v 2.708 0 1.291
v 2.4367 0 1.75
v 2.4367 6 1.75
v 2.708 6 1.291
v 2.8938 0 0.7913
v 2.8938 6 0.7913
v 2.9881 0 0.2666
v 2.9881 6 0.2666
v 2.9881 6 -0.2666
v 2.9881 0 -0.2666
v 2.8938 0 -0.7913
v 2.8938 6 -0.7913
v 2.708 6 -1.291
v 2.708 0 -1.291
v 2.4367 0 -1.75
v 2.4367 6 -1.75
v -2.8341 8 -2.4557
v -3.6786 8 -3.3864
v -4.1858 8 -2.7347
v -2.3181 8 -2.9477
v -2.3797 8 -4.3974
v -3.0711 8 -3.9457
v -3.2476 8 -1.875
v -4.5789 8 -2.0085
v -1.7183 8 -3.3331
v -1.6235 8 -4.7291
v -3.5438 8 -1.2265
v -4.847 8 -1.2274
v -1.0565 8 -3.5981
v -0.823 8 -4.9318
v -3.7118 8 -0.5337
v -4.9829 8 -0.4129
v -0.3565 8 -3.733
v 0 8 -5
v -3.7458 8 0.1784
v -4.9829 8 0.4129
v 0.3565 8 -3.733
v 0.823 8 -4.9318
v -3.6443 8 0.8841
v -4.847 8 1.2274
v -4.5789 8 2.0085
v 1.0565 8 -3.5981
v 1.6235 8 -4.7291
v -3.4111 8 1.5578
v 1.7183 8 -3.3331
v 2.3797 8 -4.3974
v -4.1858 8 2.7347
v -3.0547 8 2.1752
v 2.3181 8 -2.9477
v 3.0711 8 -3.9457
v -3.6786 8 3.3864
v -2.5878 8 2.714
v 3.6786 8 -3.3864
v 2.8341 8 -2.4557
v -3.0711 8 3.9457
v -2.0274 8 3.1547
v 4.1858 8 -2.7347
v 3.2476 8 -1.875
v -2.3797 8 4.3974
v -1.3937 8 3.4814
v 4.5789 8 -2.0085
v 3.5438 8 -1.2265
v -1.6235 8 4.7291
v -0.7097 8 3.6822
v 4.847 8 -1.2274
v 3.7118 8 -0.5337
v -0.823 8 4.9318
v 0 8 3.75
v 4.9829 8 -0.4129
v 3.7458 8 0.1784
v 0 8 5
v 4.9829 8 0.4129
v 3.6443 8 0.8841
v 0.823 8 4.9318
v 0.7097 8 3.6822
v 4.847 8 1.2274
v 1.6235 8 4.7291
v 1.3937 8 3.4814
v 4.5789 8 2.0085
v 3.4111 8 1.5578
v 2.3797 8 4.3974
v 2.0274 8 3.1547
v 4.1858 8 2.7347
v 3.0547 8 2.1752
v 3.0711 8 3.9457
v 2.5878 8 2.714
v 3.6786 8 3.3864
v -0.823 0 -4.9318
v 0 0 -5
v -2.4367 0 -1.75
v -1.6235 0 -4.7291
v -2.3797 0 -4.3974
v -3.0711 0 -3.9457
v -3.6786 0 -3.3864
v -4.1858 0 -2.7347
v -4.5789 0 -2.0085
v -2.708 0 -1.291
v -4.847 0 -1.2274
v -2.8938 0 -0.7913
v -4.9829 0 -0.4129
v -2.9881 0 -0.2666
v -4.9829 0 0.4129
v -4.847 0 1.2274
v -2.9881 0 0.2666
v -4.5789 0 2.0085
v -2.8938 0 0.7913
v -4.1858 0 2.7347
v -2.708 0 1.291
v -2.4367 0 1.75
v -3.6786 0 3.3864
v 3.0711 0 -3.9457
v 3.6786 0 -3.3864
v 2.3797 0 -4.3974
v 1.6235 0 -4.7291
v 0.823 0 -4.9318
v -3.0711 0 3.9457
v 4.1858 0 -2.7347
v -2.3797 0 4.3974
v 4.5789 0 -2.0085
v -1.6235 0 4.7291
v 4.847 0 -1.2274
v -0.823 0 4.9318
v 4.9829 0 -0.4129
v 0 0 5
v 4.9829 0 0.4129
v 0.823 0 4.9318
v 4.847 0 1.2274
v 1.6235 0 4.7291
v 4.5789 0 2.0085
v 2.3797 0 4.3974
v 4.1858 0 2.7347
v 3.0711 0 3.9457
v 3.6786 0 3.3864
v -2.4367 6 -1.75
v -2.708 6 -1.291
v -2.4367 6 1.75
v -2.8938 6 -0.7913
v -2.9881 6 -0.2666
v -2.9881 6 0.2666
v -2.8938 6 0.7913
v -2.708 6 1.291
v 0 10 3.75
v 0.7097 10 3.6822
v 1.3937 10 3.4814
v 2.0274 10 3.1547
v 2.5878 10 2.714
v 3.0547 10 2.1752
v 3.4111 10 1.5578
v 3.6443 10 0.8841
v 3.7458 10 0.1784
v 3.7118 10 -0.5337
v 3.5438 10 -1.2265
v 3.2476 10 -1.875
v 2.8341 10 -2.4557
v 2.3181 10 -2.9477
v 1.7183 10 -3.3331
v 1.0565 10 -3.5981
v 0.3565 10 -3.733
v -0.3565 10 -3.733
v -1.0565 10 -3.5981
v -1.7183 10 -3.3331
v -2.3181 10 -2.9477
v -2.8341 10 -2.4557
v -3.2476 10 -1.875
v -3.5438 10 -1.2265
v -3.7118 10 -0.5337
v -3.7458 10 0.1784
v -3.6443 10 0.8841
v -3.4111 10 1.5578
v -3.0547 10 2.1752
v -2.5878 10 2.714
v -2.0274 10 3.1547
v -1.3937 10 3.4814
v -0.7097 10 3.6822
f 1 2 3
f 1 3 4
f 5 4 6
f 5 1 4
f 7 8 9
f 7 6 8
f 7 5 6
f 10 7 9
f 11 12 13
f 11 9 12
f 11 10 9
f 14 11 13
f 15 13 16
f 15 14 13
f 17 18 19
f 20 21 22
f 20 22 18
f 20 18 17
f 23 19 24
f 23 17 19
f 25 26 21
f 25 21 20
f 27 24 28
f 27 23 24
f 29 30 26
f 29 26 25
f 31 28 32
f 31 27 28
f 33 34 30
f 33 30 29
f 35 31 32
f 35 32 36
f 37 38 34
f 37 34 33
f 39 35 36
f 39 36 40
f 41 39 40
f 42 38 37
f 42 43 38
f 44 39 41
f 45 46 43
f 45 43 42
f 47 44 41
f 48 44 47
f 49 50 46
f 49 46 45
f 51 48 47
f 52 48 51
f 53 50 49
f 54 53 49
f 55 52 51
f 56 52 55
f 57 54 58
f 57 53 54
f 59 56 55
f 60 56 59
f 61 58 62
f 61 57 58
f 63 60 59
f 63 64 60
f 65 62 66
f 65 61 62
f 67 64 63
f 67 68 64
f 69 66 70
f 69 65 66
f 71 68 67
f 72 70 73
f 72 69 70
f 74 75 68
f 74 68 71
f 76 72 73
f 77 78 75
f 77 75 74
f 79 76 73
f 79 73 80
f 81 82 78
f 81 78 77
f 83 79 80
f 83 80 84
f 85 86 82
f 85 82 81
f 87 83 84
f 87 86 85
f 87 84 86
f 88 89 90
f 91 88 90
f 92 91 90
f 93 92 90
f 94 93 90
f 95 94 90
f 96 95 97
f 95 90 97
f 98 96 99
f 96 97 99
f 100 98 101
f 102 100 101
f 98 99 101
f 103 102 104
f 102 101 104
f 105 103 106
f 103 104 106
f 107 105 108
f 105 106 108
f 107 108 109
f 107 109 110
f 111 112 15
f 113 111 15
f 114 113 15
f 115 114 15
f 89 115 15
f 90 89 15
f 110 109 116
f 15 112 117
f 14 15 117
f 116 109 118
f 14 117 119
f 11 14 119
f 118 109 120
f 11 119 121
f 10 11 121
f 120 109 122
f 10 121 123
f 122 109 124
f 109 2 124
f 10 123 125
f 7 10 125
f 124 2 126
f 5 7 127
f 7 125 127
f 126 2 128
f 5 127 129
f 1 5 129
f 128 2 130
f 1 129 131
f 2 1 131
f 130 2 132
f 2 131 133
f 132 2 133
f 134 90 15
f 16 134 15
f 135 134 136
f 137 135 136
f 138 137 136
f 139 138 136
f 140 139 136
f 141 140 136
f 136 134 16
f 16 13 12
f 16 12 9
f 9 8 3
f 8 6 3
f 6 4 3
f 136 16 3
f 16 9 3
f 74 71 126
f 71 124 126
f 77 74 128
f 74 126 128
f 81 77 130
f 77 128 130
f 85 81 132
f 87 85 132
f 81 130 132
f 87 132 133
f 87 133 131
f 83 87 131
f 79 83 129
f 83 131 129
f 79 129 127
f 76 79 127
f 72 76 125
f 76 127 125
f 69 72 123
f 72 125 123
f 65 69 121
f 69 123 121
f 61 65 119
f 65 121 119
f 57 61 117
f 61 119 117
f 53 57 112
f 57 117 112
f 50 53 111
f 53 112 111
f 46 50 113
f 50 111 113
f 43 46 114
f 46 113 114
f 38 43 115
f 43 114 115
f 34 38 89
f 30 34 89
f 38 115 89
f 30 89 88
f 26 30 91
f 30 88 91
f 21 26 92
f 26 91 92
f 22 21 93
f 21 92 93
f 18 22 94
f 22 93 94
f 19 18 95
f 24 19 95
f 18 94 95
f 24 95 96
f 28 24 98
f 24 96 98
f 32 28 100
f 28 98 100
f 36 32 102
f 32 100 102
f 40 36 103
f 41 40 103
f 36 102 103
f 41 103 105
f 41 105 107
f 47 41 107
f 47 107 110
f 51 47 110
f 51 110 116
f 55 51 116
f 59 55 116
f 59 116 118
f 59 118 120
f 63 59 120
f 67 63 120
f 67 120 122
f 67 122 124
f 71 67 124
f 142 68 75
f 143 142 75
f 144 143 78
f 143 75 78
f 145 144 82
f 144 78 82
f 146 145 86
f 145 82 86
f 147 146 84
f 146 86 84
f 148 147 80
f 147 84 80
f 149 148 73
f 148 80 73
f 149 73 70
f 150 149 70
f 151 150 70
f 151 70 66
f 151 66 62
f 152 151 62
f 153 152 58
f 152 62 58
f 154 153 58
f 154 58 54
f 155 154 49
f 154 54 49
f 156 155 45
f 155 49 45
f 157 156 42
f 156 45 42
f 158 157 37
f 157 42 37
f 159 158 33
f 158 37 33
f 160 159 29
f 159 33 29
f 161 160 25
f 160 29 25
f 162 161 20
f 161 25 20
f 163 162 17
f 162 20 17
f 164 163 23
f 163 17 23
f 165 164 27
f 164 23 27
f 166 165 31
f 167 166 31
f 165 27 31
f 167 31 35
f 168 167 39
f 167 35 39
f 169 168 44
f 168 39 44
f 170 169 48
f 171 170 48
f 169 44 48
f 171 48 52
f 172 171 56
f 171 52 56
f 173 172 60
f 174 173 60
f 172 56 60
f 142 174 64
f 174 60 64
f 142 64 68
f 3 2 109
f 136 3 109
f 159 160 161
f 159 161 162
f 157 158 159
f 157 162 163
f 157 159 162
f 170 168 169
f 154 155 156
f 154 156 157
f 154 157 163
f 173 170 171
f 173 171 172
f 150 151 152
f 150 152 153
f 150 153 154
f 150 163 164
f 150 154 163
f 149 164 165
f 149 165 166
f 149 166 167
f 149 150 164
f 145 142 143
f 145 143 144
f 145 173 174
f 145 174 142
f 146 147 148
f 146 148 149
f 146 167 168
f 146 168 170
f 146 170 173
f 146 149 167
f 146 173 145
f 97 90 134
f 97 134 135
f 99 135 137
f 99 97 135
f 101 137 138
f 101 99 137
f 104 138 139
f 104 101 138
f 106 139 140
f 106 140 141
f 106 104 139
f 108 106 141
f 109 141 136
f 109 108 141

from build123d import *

# Parameters (mm, degrees)
SKETCH1_R           = 5
SKETCH1_R_2         = 3
BOSS_EXTRUDE1_DEPTH = 6
SKETCH5_R           = 5
BOSS_EXTRUDE5_DEPTH = 2
SKETCH7_R           = 3.75
BOSS_EXTRUDE6_DEPTH = 2


with BuildPart() as part:
    # Sketch1 → Boss-Extrude1 (new body)
    # profile 1 of 3: a face of its own
    with BuildSketch(Plane(origin=(0, 0, 0), x_dir=(1, 0, 0), z_dir=(0, 1, 0))):
        with Locations(Location((0, 0, 0), (0, 0, 270))):
            Circle(SKETCH1_R)
        Circle(SKETCH1_R_2, mode=Mode.SUBTRACT)
    # profile 2 of 3: a face of its own
    with BuildSketch(Plane(origin=(0, 0, 0), x_dir=(1, 0, 0), z_dir=(0, 1, 0))):
        with BuildLine():
            Line((2.436698586, -1.75), (-2.436698586, -1.75))
            ThreePointArc((-2.436698586, -1.75), (0, -3), (2.436698586, -1.75))
        make_face()
    # profile 3 of 3: a face of its own
    with BuildSketch(Plane(origin=(0, 0, 0), x_dir=(1, 0, 0), z_dir=(0, 1, 0))):
        with BuildLine():
            ThreePointArc((2.436698586, 1.75), (0, 3), (-2.436698586, 1.75))
            Line((-2.436698586, 1.75), (2.436698586, 1.75))
        make_face()
    extrude(amount=BOSS_EXTRUDE1_DEPTH)

    # Sketch5 → Boss-Extrude5 (add)
    with BuildSketch(Plane(origin=(0, 6, 0), x_dir=(1, 0, 0), z_dir=(0, 1, 0))):
        with Locations(Location((0, 0, 0), (0, 0, 270))):
            Circle(SKETCH5_R)
    extrude(amount=BOSS_EXTRUDE5_DEPTH)

    # Sketch7 → Boss-Extrude6 (add)
    with BuildSketch(Plane(origin=(0, 8, 0), x_dir=(1, 0, 0), z_dir=(0, 1, 0))):
        with Locations(Location((0, 0, 0), (0, 0, 270))):
            Circle(SKETCH7_R)
    extrude(amount=BOSS_EXTRUDE6_DEPTH)


solid = part.part
